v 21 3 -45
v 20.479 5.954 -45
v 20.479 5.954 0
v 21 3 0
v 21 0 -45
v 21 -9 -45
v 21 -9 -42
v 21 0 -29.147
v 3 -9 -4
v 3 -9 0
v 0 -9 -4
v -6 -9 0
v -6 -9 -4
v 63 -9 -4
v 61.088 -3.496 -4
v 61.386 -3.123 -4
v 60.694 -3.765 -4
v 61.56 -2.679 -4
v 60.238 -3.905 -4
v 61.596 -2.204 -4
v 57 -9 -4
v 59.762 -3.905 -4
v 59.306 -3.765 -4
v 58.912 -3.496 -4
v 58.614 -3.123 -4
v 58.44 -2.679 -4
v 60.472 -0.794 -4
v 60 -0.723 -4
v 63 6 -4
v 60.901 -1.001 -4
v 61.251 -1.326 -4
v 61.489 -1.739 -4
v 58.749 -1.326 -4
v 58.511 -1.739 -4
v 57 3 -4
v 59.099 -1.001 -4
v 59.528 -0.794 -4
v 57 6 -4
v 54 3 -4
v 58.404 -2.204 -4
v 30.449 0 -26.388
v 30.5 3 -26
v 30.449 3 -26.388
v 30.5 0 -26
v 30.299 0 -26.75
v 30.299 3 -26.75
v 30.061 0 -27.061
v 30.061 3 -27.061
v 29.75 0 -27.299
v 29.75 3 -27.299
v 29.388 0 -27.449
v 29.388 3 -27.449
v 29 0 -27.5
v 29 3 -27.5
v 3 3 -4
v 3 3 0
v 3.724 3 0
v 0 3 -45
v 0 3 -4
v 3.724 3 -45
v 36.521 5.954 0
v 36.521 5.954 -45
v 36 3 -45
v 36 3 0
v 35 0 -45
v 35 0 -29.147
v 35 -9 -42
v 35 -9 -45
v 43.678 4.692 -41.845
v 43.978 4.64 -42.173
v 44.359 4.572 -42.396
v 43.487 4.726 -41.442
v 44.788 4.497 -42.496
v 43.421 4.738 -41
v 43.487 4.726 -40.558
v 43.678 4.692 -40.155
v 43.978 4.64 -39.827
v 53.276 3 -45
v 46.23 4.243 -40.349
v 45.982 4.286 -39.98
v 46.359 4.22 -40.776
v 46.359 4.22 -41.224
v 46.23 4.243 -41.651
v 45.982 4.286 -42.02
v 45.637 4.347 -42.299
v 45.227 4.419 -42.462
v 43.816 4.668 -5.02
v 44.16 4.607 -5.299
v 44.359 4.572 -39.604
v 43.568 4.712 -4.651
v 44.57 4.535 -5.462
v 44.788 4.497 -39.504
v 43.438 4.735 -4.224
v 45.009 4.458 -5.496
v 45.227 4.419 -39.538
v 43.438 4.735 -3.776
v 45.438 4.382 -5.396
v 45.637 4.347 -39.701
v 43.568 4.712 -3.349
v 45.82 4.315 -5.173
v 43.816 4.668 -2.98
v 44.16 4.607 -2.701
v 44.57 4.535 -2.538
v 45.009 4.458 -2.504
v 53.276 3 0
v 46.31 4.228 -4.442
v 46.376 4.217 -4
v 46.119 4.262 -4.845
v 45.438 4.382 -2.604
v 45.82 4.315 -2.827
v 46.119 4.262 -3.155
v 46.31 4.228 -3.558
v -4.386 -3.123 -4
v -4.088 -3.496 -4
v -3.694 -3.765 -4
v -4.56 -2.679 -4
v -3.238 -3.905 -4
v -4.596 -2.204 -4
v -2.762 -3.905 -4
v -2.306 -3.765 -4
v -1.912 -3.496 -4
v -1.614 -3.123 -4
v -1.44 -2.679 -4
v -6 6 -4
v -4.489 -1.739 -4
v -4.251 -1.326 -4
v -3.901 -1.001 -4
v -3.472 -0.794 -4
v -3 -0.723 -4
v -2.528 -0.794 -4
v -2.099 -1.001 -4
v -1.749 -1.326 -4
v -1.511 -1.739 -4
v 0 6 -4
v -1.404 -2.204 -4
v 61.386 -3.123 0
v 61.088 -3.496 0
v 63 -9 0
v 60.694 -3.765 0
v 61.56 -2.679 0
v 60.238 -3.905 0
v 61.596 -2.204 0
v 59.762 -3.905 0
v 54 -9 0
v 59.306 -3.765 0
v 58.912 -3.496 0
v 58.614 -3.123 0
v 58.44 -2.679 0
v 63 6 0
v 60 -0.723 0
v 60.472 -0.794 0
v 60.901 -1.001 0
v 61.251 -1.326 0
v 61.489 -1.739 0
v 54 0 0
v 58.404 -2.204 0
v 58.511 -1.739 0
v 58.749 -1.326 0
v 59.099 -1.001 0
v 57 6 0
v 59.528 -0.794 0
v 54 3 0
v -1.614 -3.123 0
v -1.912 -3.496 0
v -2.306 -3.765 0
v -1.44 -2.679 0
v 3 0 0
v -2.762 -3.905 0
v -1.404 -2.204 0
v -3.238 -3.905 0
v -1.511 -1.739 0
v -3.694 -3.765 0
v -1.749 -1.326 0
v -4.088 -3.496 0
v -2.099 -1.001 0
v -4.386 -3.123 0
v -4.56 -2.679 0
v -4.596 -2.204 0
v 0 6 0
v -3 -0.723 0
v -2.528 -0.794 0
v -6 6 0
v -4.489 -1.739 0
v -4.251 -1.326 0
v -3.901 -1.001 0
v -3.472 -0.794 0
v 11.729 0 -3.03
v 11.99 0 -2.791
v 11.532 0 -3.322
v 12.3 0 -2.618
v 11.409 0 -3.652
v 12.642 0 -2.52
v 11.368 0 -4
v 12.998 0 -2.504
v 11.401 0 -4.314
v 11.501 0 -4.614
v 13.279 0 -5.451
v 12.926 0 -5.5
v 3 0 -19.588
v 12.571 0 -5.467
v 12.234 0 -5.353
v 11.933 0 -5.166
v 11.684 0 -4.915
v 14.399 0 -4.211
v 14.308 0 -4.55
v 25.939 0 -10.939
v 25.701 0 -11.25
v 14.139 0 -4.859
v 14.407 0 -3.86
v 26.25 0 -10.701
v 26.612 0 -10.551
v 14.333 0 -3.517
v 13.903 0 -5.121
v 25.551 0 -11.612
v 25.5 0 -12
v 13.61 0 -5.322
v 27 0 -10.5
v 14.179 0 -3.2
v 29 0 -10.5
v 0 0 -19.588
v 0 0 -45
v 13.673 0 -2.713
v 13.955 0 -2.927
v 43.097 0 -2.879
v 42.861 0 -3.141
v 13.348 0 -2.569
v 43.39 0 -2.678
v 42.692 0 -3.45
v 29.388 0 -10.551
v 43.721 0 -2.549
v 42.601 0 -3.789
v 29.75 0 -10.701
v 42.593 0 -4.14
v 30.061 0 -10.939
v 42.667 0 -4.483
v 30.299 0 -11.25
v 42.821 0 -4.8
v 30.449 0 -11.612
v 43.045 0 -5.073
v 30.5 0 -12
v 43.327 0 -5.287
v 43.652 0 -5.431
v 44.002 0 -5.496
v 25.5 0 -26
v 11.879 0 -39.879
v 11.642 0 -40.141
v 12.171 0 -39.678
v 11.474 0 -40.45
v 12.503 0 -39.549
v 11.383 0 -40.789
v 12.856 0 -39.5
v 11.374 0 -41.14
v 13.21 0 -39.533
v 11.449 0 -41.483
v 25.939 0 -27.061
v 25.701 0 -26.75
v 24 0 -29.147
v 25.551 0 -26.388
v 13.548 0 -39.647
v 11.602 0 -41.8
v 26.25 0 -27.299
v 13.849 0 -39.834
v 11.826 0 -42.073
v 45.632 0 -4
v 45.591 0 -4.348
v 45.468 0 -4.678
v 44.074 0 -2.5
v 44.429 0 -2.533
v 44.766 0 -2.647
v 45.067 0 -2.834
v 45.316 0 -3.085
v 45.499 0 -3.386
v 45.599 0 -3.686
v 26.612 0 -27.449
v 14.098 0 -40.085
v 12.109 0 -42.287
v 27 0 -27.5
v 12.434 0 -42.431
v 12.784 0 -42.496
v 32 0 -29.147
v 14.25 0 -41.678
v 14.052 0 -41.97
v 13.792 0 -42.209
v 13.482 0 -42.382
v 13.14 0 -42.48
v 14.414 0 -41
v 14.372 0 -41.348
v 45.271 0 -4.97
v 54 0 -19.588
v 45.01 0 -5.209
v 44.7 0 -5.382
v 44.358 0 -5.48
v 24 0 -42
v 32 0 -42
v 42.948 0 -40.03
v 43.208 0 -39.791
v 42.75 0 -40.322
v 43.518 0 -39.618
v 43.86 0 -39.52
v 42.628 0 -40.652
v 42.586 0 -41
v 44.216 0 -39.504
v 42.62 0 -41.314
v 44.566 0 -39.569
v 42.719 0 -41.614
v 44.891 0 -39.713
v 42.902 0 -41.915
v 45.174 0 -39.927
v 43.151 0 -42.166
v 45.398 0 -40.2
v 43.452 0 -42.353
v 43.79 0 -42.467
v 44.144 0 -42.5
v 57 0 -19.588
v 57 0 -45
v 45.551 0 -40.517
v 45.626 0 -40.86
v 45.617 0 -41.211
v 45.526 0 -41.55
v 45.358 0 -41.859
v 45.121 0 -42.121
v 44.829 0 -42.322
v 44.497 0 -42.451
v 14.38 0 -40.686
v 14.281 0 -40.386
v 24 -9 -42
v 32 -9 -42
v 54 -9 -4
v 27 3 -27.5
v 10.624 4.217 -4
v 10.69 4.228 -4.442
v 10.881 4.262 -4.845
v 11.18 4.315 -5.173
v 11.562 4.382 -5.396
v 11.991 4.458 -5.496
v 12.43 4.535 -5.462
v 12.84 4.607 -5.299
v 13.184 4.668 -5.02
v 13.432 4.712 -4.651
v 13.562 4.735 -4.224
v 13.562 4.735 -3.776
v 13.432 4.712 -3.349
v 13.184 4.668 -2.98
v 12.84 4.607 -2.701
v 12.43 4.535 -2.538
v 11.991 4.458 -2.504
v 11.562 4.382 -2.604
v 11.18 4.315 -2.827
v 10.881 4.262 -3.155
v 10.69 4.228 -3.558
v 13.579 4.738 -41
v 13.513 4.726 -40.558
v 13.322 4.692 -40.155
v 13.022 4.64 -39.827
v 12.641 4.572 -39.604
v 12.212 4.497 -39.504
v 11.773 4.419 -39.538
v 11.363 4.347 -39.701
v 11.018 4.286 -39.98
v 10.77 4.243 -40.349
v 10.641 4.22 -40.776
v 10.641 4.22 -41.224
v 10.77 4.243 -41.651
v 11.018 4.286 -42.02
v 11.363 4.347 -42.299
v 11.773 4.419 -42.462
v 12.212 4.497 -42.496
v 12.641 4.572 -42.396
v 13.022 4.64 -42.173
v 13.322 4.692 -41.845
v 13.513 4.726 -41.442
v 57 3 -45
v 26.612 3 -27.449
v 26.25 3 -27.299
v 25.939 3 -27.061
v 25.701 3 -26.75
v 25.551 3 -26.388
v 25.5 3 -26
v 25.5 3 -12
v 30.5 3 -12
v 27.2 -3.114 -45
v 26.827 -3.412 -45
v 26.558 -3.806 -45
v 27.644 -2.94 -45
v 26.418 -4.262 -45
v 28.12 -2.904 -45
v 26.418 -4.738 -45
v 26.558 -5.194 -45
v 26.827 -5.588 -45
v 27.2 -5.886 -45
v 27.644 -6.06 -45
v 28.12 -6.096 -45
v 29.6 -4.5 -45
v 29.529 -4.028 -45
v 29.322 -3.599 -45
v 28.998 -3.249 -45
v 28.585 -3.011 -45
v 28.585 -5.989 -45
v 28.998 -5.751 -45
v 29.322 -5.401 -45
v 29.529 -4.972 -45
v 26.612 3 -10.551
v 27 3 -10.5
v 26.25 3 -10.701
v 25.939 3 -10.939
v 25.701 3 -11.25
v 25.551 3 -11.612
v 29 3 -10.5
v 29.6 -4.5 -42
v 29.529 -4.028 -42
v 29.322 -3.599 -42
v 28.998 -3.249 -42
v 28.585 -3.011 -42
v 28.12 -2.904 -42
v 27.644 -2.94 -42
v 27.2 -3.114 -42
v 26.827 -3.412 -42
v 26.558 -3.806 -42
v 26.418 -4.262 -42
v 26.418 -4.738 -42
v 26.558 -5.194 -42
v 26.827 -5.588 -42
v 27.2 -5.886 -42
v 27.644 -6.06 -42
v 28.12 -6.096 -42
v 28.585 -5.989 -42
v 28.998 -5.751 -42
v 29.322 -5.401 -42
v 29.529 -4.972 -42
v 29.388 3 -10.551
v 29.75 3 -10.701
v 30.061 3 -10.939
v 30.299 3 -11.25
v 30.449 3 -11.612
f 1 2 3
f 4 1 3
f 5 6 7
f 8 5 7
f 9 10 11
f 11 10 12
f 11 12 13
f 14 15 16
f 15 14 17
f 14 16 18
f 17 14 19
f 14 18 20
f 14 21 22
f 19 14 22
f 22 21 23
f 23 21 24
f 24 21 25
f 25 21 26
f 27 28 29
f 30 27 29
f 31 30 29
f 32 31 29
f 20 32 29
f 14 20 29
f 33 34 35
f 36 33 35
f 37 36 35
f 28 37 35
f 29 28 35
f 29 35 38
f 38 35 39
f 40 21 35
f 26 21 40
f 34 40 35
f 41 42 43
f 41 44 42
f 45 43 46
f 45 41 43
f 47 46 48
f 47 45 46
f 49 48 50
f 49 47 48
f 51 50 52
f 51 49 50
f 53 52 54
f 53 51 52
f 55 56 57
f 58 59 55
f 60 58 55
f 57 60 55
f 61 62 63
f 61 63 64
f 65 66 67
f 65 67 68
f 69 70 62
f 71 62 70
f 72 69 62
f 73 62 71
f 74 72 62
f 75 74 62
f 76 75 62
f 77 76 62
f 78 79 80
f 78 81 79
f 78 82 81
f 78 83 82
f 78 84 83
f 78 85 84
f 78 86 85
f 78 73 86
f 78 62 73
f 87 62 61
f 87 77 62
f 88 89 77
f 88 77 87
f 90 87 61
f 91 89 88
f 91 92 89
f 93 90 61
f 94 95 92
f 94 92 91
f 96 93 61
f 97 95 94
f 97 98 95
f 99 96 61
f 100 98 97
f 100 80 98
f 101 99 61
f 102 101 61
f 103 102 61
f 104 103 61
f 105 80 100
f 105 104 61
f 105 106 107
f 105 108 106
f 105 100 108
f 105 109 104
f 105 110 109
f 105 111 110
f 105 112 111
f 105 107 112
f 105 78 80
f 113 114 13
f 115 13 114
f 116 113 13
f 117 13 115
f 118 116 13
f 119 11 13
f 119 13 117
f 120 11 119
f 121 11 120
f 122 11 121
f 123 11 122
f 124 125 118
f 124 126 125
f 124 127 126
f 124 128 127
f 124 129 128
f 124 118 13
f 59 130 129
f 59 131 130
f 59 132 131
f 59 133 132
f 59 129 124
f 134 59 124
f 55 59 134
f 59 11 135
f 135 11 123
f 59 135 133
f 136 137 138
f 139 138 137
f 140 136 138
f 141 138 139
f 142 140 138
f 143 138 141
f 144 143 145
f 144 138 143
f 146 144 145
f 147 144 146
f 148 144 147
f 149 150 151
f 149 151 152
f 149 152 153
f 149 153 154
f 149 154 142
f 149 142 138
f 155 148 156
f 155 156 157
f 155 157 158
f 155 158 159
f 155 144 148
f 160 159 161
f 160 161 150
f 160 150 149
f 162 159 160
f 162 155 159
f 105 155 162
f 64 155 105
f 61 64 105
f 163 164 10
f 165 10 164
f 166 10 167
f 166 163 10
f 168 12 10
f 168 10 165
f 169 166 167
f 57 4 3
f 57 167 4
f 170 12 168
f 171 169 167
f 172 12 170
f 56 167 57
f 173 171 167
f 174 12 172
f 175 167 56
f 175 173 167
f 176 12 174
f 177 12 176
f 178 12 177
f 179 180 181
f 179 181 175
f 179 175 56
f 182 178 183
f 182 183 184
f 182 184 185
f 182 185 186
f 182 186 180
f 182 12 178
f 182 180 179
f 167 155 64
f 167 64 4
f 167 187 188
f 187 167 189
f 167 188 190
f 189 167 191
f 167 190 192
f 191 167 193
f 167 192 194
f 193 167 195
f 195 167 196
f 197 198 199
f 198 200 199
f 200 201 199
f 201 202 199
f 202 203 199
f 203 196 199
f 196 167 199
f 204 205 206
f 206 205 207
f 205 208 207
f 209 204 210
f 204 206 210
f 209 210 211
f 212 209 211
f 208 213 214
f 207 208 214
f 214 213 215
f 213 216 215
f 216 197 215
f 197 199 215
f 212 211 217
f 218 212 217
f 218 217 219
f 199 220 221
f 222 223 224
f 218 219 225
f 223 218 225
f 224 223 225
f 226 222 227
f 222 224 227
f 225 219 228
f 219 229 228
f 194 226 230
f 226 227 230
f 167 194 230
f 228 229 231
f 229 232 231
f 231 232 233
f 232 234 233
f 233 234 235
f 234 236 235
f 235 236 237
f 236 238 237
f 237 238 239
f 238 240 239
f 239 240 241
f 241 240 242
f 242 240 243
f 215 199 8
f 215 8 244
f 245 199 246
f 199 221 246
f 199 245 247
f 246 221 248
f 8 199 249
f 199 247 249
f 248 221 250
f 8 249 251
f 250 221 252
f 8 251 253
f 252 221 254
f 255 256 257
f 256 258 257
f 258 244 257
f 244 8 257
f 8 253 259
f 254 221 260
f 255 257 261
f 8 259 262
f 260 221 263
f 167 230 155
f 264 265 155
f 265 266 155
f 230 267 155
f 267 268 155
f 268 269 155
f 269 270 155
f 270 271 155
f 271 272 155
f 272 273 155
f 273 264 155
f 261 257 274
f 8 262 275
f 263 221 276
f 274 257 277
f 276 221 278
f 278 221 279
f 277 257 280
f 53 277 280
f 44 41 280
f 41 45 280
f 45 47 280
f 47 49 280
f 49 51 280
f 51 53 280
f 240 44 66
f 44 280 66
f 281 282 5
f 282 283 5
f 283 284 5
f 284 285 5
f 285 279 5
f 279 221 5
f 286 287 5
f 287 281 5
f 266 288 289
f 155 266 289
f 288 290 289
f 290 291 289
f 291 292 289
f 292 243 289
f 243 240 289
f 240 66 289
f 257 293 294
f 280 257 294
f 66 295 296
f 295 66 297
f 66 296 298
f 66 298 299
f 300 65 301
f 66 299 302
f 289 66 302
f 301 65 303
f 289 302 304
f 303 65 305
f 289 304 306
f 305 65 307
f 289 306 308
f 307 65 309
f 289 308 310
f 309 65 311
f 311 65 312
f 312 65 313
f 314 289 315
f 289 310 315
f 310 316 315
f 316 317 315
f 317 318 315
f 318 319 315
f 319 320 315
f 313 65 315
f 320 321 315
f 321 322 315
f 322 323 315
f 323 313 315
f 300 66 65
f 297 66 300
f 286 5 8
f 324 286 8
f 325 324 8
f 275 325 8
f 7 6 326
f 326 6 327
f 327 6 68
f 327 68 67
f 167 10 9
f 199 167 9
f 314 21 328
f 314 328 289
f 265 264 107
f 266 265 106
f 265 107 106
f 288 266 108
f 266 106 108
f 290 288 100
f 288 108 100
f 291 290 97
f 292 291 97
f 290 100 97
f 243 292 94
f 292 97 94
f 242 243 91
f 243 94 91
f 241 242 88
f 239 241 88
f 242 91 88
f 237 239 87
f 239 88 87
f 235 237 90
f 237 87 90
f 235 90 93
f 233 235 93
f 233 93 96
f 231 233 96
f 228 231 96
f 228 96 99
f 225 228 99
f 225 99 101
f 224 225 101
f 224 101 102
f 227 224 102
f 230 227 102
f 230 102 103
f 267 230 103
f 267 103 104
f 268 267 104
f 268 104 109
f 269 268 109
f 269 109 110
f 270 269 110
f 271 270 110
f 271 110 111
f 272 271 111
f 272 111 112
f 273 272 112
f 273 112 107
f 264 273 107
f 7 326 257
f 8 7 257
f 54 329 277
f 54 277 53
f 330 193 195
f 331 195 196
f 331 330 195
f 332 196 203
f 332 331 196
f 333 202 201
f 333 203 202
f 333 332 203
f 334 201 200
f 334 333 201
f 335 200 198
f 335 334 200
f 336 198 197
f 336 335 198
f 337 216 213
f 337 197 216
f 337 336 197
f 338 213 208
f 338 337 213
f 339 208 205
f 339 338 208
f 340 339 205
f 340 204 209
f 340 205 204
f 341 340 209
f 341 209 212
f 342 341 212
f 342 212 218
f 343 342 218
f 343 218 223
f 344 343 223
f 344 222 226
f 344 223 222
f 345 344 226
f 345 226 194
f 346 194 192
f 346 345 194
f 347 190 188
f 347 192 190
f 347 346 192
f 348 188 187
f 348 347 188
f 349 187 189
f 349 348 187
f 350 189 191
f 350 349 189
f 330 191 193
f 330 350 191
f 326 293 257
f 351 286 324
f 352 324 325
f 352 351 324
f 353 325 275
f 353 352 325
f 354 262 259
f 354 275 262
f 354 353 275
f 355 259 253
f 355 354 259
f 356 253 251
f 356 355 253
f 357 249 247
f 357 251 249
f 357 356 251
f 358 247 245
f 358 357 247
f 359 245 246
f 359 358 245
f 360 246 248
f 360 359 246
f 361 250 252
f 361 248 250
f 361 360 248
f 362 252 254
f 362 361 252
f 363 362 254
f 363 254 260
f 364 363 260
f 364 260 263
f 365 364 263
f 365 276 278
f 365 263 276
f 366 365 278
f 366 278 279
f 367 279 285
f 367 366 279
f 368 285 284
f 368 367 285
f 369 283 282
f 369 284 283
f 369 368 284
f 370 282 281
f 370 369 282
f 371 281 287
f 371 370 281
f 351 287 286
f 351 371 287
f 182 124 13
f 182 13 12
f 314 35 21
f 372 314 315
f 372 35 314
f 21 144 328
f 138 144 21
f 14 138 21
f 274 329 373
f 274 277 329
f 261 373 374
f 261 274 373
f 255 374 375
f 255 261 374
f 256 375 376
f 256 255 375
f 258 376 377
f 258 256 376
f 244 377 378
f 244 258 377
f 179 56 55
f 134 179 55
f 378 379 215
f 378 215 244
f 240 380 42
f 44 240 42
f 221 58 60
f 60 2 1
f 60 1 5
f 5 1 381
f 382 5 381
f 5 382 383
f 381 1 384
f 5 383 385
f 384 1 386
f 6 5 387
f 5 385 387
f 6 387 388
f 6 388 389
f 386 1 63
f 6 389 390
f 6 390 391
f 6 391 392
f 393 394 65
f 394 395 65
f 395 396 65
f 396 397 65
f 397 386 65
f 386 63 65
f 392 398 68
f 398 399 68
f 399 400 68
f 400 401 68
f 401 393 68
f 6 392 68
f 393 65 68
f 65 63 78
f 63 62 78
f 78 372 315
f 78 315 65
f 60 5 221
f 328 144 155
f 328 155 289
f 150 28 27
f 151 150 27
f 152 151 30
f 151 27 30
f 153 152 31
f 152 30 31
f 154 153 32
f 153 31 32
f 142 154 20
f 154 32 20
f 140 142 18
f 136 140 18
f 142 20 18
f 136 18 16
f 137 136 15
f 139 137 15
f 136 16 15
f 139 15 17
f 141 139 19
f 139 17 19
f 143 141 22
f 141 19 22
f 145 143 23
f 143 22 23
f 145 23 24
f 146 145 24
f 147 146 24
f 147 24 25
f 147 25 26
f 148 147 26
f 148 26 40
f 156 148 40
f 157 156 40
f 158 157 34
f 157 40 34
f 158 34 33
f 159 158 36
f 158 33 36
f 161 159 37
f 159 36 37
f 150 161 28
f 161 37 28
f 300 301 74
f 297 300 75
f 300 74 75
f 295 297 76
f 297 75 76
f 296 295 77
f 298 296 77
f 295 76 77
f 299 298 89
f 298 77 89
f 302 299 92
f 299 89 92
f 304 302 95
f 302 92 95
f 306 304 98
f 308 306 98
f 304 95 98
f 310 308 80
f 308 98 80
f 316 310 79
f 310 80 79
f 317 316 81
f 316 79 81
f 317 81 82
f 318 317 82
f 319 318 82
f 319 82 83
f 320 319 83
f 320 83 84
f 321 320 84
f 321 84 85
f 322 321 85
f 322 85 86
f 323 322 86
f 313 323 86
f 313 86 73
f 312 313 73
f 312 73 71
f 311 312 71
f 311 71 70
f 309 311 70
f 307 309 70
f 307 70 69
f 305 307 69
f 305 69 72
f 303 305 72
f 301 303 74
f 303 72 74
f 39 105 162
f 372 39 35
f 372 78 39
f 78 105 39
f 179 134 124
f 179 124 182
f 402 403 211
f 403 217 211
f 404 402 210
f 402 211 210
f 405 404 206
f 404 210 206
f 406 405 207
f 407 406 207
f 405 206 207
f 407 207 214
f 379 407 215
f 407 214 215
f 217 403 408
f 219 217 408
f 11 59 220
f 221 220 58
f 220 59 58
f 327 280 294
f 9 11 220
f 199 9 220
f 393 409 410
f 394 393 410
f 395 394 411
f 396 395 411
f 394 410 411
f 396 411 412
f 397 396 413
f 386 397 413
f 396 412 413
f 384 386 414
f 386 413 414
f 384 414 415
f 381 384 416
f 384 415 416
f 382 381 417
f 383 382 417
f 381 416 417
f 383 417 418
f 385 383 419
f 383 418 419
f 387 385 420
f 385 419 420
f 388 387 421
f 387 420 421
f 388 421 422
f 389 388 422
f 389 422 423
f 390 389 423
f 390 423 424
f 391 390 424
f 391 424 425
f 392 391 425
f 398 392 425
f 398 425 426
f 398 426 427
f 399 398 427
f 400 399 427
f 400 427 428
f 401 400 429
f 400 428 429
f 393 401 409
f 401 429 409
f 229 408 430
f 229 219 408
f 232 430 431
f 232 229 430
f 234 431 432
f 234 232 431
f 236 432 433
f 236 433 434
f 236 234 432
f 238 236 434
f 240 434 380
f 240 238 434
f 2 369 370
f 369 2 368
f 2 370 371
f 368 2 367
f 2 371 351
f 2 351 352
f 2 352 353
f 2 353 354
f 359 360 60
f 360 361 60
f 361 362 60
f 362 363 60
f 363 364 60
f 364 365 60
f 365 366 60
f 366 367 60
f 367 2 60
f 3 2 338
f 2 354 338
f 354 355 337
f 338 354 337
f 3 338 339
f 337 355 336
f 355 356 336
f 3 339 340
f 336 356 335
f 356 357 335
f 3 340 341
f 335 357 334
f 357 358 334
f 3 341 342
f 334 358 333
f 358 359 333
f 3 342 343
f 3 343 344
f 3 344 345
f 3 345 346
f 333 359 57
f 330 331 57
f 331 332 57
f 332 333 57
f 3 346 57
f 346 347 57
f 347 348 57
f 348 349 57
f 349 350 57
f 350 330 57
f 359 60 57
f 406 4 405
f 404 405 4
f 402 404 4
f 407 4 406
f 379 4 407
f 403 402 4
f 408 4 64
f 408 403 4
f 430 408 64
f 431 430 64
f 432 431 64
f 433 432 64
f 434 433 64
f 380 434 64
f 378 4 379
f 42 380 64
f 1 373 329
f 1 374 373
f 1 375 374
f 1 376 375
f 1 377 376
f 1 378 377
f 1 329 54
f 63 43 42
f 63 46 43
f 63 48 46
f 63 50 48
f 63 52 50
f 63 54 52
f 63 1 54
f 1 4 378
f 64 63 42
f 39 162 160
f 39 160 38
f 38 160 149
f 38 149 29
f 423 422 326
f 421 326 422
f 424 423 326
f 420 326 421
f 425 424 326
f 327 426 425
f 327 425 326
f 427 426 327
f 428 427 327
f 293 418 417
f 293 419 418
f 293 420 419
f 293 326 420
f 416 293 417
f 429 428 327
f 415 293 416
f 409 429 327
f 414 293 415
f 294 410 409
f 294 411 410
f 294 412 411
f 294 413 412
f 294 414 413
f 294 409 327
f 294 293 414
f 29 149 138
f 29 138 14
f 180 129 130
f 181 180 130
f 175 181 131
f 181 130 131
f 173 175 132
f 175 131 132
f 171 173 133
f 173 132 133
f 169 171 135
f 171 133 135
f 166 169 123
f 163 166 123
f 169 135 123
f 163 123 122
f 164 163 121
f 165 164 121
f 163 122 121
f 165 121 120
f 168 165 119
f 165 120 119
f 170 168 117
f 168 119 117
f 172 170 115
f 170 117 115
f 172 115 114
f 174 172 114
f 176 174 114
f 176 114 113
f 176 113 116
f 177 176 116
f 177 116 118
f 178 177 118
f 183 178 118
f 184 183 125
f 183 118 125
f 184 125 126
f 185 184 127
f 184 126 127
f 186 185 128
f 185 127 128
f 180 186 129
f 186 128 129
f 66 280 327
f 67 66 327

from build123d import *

# Parameters (mm, degrees)
SKETCH_1_W          = 57
SKETCH_1_H          = 45
EXTRUDE_1_DEPTH     = 3
SKETCH_2_W          = 4
SKETCH_2_H          = 15
EXTRUDE_2_DEPTH     = 6
SKETCH_3_W          = 4
SKETCH_3_H          = 15
EXTRUDE_3_DEPTH     = 6
EXTRUDE_4_DEPTH     = 3
SKETCH_5_W          = 4
SKETCH_5_H          = 9
EXTRUDE_5_DEPTH     = 3
CHAMFER_1_SIZE      = 3
SKETCH_6_R          = 1.6
CUT_EXTRUDE_1_DEPTH = 4
SKETCH_8_W          = 8
SKETCH_8_H          = 3
EXTRUDE_6_DEPTH     = 9
EXTRUDE_7_DEPTH     = 3
EXTRUDE_8_DEPTH     = 3
SKETCH_11_R         = 1.6
CUT_EXTRUDE_3_DEPTH = 3
SKETCH_12_W         = 5
SKETCH_12_H         = 17
CUT_EXTRUDE_4_DEPTH = 3
FILLET_1_R          = 1.5
EXTRUDE_9_REACH     = 80.57
SKETCH_15_W         = 45
SKETCH_15_H         = 17.726539555
SKETCH_16_R         = 1.5
CUT_EXTRUDE_5_DEPTH = 79.570276896


with BuildPart() as part:
    # 草图1 → 凸台-拉伸1 (new body)
    with BuildSketch(Plane(origin=(0, 0, 0), x_dir=(1, 0, 0), z_dir=(0, 1, 0))):
        with Locations((28.5, 22.5)):
            Rectangle(SKETCH_1_W, SKETCH_1_H)
    extrude(amount=EXTRUDE_1_DEPTH)

    # 草图2 → 凸台-拉伸2 (add)
    with BuildSketch(Plane.ZY):
        with Locations((-2, -1.5)):
            Rectangle(SKETCH_2_W, SKETCH_2_H)
    extrude(amount=EXTRUDE_2_DEPTH)

    # 草图3 → 凸台-拉伸3 (add)
    with BuildSketch(Plane(origin=(57, 0, 0), x_dir=(0, 0, -1), z_dir=(1, 0, 0))):
        with Locations((2, -1.5)):
            Rectangle(SKETCH_3_W, SKETCH_3_H)
    extrude(amount=EXTRUDE_3_DEPTH)

    # 草图4 → 凸台-拉伸4 (add)
    with BuildSketch(Plane.ZY.offset(-57)):
        Polygon((-4, -9), (-19.588457268, 0), (0, 0), (0, -9), align=None)
    extrude(amount=EXTRUDE_4_DEPTH)

    # 草图5 → 凸台-拉伸5 (add)
    with BuildSketch(Plane(origin=(0, 0, 0), x_dir=(0, 0, -1), z_dir=(1, 0, 0))):
        Polygon((19.588457268, 0), (4, 0), (4, -9), align=None)
        with Locations((2, -4.5)):
            Rectangle(SKETCH_5_W, SKETCH_5_H)
    extrude(amount=EXTRUDE_5_DEPTH)

    # 倒角1
    chamfer_1_edges = [part.edges().sort_by_distance(p)[0] for p in [
        (0, 3, -2),
        (57, 3, -2),
    ]]
    chamfer(chamfer_1_edges, length=CHAMFER_1_SIZE - 0.0001)  # a hair under: the kernel refuses the full size

    # 草图6 → 切除-拉伸1 (cut)
    with BuildSketch(Plane(origin=(0, 0, -4), x_dir=(-1, 0, 0), z_dir=(0, 0, -1))):
        with Locations(Location((3, -2.323268139, 0), (0, 0, 90))):
            Circle(SKETCH_6_R)
        with Locations(Location((-60, -2.323268139, 0), (0, 0, 90))):
            Circle(SKETCH_6_R)
    extrude(amount=-CUT_EXTRUDE_1_DEPTH, mode=Mode.SUBTRACT)

    # 草图8 → 凸台-拉伸6 (add)
    with BuildSketch(Plane.XZ):
        with Locations((28, -43.5)):
            Rectangle(SKETCH_8_W, SKETCH_8_H)
    extrude(amount=EXTRUDE_6_DEPTH)

    # 草图9 → 凸台-拉伸7 (add)
    with BuildSketch(Plane(origin=(32, 0, 0), x_dir=(0, 0, -1), z_dir=(1, 0, 0))):
        Polygon((45, 0), (29.146667939, 0), (42, -9), (45, -9), align=None)
    extrude(amount=EXTRUDE_7_DEPTH)

    # 草图10 → 凸台-拉伸8 (add)
    with BuildSketch(Plane.ZY.offset(-24)):
        Polygon((-45, 0), (-45, -9), (-42, -9), (-29.146667939, 0), align=None)
    extrude(amount=EXTRUDE_8_DEPTH)

    # 草图11 → 切除-拉伸3 (cut)
    with BuildSketch(Plane.XY.offset(-42)):
        with Locations((28, -4.5)):
            Circle(SKETCH_11_R)
    extrude(amount=-CUT_EXTRUDE_3_DEPTH, mode=Mode.SUBTRACT)

    # 草图12 → 切除-拉伸4 (cut)
    with BuildSketch(Plane(origin=(0, 3, 0), x_dir=(1, 0, 0), z_dir=(0, 1, 0))):
        with Locations((28, 19)):
            Rectangle(SKETCH_12_W, SKETCH_12_H)
    extrude(amount=-CUT_EXTRUDE_4_DEPTH, mode=Mode.SUBTRACT)

    # 圆角1
    fillet_1_edges = [part.edges().sort_by_distance(p)[0] for p in [
        (25.5, 1.5, -27.5),
        (30.5, 1.5, -27.5),
        (30.5, 1.5, -10.5),
        (25.5, 1.5, -10.5),
    ]]
    fillet(fillet_1_edges, radius=FILLET_1_R)

    # 草图15 → 凸台-拉伸9 (add, up to next)
    with BuildSketch(Plane(origin=(2.119507574, 12.02032477, 0), x_dir=(0, 0, 1), z_dir=(0.17364817766693066, 0.9848077530122081, 0)), mode=Mode.PRIVATE) as extrude_9_sk1:
        with Locations((-22.5, 43.795404353)):
            Rectangle(SKETCH_15_W, SKETCH_15_H)
    extrude_9_tool1 = extrude(extrude_9_sk1.sketch, amount=-EXTRUDE_9_REACH, mode=Mode.PRIVATE) - part.part
    extrude_9 = extrude_9_tool1.solids().sort_by_distance((45.249561, 4.415333, -22.5))[0]
    add(extrude_9)

    # 草图16 → 切除-拉伸5 (cut, through all)
    with BuildSketch(Plane(origin=(2.119507574, 12.02032477, 0), x_dir=(0.9848077530122081, -0.17364817766693064, 0), z_dir=(0.17364817766693064, 0.9848077530122081, 0))):
        with Locations(Location((43.439057305, 41, 0), (0, 0, 180))):
            Circle(SKETCH_16_R)
        with Locations((43.439057305, 4)):
            Circle(SKETCH_16_R)
    cut_extrude_5 = extrude(amount=-CUT_EXTRUDE_5_DEPTH, mode=Mode.SUBTRACT)

    # 镜向1: 凸台-拉伸9, 切除-拉伸5 across plane
    add(extrude_9.mirror(Plane(origin=(28.5, 0, 0), x_dir=(0, 0, 1), z_dir=(1, 0, 0))))
    add(cut_extrude_5.mirror(Plane(origin=(28.5, 0, 0), x_dir=(0, 0, 1), z_dir=(1, 0, 0))), mode=Mode.SUBTRACT)


solid = part.part
